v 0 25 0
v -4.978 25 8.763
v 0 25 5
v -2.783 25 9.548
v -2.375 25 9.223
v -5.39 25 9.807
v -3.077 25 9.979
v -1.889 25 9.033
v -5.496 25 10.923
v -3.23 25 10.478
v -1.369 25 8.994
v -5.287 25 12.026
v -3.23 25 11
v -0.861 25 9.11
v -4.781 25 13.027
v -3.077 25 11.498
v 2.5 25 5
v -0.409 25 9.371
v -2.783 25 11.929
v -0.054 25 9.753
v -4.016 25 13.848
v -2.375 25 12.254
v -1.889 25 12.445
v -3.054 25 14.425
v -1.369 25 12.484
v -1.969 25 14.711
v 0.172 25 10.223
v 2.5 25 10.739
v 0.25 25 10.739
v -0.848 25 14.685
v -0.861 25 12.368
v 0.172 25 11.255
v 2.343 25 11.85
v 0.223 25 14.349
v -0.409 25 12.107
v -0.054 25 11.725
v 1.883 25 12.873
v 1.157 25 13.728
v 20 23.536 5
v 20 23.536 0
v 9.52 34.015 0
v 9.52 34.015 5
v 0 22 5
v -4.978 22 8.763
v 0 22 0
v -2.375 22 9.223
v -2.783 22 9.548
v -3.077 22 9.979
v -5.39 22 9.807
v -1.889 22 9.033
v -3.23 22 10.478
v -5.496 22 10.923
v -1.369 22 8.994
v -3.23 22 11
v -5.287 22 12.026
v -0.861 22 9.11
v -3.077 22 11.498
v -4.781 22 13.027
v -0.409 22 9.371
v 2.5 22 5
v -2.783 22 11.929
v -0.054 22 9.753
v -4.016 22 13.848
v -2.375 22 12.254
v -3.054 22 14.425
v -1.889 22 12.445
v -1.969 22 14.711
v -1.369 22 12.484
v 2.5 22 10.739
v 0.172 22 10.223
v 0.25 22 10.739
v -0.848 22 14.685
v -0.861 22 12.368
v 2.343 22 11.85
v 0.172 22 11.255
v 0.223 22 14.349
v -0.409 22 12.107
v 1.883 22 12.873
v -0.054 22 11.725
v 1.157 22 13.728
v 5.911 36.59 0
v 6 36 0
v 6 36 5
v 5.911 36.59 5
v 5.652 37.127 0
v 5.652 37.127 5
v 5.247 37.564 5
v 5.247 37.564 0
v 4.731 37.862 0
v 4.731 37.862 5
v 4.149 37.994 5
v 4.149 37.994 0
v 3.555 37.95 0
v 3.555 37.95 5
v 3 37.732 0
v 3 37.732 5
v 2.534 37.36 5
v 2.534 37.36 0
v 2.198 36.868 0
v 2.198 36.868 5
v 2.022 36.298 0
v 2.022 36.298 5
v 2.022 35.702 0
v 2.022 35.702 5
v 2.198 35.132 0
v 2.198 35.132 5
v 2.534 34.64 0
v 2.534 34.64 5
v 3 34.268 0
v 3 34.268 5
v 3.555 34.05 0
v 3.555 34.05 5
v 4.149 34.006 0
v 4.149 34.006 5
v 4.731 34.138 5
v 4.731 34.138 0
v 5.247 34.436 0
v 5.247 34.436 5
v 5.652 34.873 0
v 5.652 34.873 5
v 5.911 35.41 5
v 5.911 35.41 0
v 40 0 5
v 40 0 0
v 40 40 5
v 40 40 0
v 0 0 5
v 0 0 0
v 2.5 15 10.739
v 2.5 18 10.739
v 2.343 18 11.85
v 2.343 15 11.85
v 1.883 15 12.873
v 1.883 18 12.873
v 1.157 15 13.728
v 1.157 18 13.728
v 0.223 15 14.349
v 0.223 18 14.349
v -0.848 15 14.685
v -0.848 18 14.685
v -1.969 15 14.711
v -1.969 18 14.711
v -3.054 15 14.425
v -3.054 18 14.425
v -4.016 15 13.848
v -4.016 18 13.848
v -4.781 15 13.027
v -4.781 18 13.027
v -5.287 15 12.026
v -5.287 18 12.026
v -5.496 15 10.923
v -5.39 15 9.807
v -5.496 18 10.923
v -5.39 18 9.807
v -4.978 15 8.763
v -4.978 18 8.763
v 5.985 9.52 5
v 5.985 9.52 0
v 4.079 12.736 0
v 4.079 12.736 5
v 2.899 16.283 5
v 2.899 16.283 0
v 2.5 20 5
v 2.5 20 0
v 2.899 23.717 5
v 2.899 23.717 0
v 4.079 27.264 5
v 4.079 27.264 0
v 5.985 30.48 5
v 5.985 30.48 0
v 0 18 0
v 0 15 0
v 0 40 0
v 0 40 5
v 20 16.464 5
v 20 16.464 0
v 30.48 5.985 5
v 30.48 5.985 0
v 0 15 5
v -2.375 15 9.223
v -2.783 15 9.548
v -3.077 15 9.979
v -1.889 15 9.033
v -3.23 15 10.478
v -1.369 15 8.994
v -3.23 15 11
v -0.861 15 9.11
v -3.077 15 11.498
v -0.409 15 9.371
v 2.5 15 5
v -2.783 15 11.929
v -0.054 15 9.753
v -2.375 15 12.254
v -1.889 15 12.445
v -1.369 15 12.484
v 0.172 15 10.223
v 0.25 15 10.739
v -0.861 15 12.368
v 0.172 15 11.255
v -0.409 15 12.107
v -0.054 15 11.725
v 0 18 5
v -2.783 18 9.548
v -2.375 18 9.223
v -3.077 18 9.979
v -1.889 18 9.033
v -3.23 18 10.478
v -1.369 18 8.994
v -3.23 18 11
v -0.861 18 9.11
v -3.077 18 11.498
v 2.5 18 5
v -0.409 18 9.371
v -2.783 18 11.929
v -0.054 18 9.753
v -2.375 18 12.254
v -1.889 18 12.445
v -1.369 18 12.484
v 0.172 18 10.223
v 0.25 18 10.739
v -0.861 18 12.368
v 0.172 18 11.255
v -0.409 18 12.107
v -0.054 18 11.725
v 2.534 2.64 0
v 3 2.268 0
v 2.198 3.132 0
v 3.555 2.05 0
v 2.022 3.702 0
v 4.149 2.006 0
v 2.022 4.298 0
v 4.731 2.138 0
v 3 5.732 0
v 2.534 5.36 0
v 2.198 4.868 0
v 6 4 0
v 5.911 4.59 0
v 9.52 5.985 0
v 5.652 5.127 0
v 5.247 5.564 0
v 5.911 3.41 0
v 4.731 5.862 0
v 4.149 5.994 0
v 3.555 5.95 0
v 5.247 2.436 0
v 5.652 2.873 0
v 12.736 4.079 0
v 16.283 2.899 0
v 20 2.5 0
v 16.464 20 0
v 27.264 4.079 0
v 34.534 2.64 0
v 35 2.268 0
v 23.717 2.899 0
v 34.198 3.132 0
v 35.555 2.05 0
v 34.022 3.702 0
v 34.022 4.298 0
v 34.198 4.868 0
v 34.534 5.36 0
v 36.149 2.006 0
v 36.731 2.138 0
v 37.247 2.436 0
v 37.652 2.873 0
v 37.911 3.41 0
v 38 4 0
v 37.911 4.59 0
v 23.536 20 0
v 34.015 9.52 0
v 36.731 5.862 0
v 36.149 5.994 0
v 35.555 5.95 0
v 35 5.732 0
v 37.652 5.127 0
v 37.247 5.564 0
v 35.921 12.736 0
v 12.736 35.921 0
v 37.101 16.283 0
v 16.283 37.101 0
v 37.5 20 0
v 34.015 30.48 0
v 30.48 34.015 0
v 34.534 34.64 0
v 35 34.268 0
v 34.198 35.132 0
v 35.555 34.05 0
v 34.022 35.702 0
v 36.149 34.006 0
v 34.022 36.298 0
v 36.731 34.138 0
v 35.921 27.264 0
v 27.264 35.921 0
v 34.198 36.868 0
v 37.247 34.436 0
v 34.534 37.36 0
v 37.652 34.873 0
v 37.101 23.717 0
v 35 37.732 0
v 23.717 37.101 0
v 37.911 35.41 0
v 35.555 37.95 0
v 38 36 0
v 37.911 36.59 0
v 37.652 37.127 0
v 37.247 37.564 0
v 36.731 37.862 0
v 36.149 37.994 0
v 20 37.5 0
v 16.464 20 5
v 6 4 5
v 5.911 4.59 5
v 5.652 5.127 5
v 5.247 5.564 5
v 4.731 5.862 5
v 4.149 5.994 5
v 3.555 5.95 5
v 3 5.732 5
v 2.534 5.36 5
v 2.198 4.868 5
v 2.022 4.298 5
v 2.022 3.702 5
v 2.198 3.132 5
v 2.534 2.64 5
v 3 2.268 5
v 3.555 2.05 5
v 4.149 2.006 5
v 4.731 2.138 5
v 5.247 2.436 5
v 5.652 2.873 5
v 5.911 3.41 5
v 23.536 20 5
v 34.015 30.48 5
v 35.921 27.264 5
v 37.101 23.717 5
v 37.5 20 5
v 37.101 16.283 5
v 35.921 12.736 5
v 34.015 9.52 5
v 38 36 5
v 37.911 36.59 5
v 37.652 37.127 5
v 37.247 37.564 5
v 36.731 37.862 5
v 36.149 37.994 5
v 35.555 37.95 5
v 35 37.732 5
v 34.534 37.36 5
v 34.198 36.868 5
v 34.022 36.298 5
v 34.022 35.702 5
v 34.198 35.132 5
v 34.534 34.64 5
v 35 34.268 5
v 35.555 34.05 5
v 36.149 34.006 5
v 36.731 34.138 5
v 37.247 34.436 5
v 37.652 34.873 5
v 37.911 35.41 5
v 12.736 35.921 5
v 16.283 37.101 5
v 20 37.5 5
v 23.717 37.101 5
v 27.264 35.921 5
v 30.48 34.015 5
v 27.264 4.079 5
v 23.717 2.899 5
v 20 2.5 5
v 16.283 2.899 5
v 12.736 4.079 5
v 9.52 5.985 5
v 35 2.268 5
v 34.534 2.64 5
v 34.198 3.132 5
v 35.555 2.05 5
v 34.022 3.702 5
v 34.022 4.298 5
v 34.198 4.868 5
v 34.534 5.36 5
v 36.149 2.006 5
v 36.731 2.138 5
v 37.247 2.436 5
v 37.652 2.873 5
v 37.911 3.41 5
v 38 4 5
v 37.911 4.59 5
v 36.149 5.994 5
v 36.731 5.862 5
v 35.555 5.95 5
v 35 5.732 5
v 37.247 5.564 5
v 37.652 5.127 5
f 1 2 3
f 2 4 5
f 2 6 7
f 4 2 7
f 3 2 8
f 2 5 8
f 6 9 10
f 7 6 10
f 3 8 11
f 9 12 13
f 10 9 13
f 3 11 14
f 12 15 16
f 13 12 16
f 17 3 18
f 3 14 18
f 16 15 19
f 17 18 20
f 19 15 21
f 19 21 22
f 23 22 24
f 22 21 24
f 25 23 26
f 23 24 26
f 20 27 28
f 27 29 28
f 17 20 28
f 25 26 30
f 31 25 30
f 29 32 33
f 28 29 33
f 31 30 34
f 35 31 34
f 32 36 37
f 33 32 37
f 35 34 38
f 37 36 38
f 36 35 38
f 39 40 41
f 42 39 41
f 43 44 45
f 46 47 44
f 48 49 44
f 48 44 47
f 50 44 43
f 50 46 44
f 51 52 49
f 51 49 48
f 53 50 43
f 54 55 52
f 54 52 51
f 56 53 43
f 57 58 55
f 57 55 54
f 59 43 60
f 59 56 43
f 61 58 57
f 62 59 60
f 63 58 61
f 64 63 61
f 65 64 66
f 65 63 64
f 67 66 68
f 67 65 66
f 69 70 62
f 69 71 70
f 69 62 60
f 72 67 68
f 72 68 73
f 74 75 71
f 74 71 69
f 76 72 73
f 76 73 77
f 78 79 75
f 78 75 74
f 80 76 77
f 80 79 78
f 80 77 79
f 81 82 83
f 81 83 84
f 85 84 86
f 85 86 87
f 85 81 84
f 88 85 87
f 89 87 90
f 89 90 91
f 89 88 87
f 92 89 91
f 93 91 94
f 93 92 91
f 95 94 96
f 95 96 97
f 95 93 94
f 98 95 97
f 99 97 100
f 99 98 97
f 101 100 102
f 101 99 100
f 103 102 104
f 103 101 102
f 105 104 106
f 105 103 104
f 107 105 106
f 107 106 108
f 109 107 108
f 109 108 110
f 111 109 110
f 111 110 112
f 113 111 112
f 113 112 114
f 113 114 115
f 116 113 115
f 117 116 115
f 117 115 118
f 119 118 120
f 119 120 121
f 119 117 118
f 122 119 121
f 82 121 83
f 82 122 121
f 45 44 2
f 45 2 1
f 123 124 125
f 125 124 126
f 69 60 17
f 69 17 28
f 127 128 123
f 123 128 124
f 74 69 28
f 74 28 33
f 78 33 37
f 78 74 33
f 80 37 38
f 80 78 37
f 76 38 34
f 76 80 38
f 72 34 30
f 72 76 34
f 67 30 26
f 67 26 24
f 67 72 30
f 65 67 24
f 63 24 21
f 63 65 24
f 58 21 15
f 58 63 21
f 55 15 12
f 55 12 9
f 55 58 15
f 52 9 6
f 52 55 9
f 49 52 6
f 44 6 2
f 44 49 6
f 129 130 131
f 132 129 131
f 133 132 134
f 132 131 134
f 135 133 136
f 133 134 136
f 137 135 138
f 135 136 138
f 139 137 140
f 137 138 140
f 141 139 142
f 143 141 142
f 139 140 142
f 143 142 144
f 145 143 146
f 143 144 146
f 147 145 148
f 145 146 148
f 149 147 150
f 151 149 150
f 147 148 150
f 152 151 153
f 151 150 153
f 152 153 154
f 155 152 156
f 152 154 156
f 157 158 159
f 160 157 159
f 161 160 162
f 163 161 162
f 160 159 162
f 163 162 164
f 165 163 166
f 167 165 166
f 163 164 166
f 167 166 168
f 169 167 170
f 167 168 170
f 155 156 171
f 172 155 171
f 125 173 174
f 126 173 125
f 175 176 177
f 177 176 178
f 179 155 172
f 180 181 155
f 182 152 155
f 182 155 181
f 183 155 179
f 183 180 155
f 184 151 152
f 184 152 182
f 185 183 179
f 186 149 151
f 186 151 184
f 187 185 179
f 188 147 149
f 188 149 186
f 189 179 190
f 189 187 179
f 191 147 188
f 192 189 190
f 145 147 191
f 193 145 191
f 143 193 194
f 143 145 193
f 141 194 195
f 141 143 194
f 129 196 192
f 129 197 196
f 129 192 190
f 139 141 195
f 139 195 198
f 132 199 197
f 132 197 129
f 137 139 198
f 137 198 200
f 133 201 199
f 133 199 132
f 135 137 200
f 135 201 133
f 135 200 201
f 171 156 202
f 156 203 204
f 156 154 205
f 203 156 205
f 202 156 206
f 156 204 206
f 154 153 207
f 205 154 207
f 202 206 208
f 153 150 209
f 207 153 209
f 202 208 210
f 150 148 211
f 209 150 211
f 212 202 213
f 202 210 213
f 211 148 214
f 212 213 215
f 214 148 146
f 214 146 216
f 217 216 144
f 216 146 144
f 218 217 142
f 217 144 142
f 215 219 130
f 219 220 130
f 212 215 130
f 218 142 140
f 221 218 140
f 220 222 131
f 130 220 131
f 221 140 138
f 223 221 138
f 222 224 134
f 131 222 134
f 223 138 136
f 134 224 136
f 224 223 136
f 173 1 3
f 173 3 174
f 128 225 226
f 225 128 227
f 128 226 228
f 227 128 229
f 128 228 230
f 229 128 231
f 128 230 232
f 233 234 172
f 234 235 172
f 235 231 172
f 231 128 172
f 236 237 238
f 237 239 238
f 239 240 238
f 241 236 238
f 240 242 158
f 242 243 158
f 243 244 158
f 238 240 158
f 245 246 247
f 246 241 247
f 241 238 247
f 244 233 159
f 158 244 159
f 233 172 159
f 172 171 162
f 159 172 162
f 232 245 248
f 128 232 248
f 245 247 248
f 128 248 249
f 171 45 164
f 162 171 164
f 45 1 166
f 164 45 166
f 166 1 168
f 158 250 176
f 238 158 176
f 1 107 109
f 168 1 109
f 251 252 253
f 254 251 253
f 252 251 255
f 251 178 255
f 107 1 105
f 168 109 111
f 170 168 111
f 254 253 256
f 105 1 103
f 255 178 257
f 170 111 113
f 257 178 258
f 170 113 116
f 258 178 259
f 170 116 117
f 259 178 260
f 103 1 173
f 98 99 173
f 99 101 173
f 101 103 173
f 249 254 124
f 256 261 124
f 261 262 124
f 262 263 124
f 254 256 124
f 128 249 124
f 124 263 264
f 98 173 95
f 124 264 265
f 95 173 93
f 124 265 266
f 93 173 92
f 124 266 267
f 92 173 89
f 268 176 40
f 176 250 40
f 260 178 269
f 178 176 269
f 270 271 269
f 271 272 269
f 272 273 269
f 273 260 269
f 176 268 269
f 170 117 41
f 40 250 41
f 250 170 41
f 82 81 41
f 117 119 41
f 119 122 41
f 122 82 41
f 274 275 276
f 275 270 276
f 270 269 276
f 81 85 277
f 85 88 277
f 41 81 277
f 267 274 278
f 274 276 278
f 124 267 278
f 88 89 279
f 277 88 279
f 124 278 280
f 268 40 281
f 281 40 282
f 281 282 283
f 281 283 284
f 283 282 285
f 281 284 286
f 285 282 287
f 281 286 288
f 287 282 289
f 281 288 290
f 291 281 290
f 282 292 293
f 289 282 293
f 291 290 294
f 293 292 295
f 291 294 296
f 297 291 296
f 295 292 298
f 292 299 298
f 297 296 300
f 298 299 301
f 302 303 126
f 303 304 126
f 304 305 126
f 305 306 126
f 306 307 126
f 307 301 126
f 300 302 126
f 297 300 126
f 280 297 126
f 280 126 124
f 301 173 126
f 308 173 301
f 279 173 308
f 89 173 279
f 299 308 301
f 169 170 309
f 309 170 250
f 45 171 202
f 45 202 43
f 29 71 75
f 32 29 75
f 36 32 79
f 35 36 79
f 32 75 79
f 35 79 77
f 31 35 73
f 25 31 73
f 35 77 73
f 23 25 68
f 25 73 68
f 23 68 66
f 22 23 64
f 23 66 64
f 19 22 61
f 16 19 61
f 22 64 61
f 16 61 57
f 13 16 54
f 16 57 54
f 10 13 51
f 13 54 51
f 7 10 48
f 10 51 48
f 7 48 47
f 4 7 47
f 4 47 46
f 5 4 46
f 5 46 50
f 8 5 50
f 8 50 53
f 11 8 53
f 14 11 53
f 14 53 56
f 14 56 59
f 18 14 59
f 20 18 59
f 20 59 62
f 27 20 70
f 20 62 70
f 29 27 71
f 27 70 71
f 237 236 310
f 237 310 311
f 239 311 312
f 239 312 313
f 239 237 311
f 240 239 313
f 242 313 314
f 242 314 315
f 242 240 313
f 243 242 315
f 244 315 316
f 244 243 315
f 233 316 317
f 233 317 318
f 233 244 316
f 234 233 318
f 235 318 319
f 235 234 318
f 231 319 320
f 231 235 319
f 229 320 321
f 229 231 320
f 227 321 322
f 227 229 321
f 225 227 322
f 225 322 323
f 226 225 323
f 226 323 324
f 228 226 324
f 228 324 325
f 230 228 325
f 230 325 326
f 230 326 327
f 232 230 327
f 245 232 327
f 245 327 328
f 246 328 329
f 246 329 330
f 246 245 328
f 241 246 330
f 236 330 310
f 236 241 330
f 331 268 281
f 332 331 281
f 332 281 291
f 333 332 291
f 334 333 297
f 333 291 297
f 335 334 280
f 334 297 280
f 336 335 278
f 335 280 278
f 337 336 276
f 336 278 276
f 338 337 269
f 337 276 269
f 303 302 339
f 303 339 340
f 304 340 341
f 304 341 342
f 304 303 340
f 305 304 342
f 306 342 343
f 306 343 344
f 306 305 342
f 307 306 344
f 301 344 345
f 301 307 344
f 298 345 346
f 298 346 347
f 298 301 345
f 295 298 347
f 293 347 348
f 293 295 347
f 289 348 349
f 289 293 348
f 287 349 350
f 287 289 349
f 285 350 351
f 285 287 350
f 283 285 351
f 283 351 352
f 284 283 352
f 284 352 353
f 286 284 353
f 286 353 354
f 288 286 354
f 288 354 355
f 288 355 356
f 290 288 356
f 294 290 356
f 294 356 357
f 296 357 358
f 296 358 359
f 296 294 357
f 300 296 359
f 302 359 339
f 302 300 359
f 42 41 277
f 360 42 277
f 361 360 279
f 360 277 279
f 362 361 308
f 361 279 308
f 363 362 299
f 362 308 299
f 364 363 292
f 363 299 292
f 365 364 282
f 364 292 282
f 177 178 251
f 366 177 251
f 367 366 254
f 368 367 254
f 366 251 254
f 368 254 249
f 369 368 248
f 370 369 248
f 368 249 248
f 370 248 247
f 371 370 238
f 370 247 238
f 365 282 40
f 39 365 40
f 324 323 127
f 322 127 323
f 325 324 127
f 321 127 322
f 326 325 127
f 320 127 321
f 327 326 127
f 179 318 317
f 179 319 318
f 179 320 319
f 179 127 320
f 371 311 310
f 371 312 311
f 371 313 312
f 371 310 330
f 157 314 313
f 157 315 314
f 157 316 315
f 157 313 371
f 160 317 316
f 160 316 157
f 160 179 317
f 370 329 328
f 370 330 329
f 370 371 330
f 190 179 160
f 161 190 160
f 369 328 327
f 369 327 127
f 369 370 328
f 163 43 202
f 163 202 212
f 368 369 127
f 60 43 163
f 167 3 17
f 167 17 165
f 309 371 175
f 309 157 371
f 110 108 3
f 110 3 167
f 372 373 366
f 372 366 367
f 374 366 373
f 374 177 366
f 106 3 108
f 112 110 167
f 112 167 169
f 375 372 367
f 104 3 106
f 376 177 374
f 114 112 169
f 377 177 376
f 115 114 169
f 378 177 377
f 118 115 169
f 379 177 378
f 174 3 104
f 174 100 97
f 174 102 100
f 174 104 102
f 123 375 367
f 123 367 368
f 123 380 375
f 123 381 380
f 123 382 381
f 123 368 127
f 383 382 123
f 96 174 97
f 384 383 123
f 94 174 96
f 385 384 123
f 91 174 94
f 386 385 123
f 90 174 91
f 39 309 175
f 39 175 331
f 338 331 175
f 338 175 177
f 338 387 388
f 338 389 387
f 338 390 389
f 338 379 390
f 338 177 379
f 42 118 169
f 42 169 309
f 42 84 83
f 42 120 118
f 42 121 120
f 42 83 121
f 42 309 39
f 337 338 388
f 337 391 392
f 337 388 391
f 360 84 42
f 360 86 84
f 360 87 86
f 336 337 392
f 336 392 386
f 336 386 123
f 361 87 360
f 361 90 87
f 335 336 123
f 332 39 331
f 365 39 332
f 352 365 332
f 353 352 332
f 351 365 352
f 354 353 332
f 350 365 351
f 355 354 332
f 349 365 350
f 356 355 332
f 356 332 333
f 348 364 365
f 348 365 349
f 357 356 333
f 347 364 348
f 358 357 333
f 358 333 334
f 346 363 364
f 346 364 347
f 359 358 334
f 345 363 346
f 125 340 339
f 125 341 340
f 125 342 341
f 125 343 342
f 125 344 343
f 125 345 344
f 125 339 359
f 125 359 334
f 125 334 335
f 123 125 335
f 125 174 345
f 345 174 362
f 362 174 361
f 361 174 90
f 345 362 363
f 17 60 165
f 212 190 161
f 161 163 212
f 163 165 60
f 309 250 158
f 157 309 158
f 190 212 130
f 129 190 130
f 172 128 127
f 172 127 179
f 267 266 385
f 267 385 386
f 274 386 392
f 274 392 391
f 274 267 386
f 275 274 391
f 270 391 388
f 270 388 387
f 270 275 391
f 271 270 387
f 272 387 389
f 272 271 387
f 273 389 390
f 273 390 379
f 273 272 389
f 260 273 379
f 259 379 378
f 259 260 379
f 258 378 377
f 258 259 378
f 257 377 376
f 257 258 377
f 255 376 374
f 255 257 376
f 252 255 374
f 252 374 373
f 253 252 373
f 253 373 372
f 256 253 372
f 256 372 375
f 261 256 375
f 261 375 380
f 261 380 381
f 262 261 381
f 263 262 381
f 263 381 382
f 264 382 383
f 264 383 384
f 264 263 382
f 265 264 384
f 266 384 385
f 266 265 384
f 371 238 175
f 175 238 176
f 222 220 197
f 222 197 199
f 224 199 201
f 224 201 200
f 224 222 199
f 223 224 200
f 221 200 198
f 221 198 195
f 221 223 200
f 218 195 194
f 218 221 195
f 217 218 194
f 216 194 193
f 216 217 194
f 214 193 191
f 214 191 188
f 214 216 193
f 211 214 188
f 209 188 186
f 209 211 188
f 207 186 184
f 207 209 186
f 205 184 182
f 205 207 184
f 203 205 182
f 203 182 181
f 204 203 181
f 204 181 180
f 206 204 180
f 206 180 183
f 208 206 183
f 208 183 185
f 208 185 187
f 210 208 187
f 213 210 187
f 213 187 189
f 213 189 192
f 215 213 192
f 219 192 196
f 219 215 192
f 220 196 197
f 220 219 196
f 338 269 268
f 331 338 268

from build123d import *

# Parameters (mm, degrees)
F0_W     = 40
F0_H     = 40
F0_R     = 2
F1_DEPTH = 5
F3_R     = 1.75
F4_DEPTH = 3
F6_R     = 1.75
F7_DEPTH = 3


with BuildPart() as f1:
    # F0 (on Top) → F1 (new body)
    with BuildSketch(Plane.XY):
        with Locations((20, 20)):
            Rectangle(F0_W, F0_H)
        with Locations((4, 4)):
            Circle(F0_R, mode=Mode.SUBTRACT)
        with BuildLine():
            ThreePointArc((30.4796817609, 5.9847843331), (20, 2.5), (9.5203182391, 5.9847843331))
            Line((9.5203182391, 5.9847843331), (20, 16.4644660941))
            Line((20, 16.4644660941), (30.4796817609, 5.9847843331))
        make_face(mode=Mode.SUBTRACT)
        with BuildLine():
            ThreePointArc((5.9847843331, 9.5203182391), (2.5, 20), (5.9847843331, 30.4796817609))
            Line((5.9847843331, 30.4796817609), (16.4644660941, 20))
            Line((16.4644660941, 20), (5.9847843331, 9.5203182391))
        make_face(mode=Mode.SUBTRACT)
        with Locations((36, 4)):
            Circle(F0_R, mode=Mode.SUBTRACT)
        with Locations((4, 36)):
            Circle(F0_R, mode=Mode.SUBTRACT)
        with BuildLine():
            ThreePointArc((34.0152156669, 30.4796817609), (37.5, 20), (34.0152156669, 9.5203182391))
            Line((34.0152156669, 9.5203182391), (23.5355339059, 20))
            Line((23.5355339059, 20), (34.0152156669, 30.4796817609))
        make_face(mode=Mode.SUBTRACT)
        with BuildLine():
            Line((30.4796817609, 34.0152156669), (20, 23.5355339059))
            Line((20, 23.5355339059), (9.5203182391, 34.0152156669))
            ThreePointArc((9.5203182391, 34.0152156669), (20, 37.5), (30.4796817609, 34.0152156669))
        make_face(mode=Mode.SUBTRACT)
        with Locations((36, 36)):
            Circle(F0_R, mode=Mode.SUBTRACT)
    extrude(amount=F1_DEPTH)

    # F3 (on offset) → F4 (join)
    with BuildSketch(Plane.XZ.offset(-22)):
        with BuildLine():
            Line((2.5, 5), (2.5, 10.7387138817))
            ThreePointArc((2.5, 10.7387138817), (-2.5217719064, 14.6060103755), (-4.9779910856, 8.762966426))
            Line((-4.9779910856, 8.762966426), (0, 0))
            Line((0, 0), (0, 5))
            Line((0, 5), (2.5, 5))
        make_face()
        with Locations((-1.5, 10.7387138817)):
            Circle(F3_R, mode=Mode.SUBTRACT)
    extrude(amount=-F4_DEPTH)

    # F6 (on offset) → F7 (join)
    with BuildSketch(Plane.XZ.offset(-18)):
        with BuildLine():
            Line((-4.9779910856, 8.762966426), (0, 0))
            Line((0, 0), (0, 5))
            Line((0, 5), (2.5, 5))
            Line((2.5, 5), (2.5, 10.7387138817))
            ThreePointArc((2.5, 10.7387138817), (-2.5217719064, 14.6060103755), (-4.9779910856, 8.762966426))
        make_face()
        with Locations((-1.5, 10.7387138817)):
            Circle(F6_R, mode=Mode.SUBTRACT)
    extrude(amount=F7_DEPTH)


solid = f1.part
